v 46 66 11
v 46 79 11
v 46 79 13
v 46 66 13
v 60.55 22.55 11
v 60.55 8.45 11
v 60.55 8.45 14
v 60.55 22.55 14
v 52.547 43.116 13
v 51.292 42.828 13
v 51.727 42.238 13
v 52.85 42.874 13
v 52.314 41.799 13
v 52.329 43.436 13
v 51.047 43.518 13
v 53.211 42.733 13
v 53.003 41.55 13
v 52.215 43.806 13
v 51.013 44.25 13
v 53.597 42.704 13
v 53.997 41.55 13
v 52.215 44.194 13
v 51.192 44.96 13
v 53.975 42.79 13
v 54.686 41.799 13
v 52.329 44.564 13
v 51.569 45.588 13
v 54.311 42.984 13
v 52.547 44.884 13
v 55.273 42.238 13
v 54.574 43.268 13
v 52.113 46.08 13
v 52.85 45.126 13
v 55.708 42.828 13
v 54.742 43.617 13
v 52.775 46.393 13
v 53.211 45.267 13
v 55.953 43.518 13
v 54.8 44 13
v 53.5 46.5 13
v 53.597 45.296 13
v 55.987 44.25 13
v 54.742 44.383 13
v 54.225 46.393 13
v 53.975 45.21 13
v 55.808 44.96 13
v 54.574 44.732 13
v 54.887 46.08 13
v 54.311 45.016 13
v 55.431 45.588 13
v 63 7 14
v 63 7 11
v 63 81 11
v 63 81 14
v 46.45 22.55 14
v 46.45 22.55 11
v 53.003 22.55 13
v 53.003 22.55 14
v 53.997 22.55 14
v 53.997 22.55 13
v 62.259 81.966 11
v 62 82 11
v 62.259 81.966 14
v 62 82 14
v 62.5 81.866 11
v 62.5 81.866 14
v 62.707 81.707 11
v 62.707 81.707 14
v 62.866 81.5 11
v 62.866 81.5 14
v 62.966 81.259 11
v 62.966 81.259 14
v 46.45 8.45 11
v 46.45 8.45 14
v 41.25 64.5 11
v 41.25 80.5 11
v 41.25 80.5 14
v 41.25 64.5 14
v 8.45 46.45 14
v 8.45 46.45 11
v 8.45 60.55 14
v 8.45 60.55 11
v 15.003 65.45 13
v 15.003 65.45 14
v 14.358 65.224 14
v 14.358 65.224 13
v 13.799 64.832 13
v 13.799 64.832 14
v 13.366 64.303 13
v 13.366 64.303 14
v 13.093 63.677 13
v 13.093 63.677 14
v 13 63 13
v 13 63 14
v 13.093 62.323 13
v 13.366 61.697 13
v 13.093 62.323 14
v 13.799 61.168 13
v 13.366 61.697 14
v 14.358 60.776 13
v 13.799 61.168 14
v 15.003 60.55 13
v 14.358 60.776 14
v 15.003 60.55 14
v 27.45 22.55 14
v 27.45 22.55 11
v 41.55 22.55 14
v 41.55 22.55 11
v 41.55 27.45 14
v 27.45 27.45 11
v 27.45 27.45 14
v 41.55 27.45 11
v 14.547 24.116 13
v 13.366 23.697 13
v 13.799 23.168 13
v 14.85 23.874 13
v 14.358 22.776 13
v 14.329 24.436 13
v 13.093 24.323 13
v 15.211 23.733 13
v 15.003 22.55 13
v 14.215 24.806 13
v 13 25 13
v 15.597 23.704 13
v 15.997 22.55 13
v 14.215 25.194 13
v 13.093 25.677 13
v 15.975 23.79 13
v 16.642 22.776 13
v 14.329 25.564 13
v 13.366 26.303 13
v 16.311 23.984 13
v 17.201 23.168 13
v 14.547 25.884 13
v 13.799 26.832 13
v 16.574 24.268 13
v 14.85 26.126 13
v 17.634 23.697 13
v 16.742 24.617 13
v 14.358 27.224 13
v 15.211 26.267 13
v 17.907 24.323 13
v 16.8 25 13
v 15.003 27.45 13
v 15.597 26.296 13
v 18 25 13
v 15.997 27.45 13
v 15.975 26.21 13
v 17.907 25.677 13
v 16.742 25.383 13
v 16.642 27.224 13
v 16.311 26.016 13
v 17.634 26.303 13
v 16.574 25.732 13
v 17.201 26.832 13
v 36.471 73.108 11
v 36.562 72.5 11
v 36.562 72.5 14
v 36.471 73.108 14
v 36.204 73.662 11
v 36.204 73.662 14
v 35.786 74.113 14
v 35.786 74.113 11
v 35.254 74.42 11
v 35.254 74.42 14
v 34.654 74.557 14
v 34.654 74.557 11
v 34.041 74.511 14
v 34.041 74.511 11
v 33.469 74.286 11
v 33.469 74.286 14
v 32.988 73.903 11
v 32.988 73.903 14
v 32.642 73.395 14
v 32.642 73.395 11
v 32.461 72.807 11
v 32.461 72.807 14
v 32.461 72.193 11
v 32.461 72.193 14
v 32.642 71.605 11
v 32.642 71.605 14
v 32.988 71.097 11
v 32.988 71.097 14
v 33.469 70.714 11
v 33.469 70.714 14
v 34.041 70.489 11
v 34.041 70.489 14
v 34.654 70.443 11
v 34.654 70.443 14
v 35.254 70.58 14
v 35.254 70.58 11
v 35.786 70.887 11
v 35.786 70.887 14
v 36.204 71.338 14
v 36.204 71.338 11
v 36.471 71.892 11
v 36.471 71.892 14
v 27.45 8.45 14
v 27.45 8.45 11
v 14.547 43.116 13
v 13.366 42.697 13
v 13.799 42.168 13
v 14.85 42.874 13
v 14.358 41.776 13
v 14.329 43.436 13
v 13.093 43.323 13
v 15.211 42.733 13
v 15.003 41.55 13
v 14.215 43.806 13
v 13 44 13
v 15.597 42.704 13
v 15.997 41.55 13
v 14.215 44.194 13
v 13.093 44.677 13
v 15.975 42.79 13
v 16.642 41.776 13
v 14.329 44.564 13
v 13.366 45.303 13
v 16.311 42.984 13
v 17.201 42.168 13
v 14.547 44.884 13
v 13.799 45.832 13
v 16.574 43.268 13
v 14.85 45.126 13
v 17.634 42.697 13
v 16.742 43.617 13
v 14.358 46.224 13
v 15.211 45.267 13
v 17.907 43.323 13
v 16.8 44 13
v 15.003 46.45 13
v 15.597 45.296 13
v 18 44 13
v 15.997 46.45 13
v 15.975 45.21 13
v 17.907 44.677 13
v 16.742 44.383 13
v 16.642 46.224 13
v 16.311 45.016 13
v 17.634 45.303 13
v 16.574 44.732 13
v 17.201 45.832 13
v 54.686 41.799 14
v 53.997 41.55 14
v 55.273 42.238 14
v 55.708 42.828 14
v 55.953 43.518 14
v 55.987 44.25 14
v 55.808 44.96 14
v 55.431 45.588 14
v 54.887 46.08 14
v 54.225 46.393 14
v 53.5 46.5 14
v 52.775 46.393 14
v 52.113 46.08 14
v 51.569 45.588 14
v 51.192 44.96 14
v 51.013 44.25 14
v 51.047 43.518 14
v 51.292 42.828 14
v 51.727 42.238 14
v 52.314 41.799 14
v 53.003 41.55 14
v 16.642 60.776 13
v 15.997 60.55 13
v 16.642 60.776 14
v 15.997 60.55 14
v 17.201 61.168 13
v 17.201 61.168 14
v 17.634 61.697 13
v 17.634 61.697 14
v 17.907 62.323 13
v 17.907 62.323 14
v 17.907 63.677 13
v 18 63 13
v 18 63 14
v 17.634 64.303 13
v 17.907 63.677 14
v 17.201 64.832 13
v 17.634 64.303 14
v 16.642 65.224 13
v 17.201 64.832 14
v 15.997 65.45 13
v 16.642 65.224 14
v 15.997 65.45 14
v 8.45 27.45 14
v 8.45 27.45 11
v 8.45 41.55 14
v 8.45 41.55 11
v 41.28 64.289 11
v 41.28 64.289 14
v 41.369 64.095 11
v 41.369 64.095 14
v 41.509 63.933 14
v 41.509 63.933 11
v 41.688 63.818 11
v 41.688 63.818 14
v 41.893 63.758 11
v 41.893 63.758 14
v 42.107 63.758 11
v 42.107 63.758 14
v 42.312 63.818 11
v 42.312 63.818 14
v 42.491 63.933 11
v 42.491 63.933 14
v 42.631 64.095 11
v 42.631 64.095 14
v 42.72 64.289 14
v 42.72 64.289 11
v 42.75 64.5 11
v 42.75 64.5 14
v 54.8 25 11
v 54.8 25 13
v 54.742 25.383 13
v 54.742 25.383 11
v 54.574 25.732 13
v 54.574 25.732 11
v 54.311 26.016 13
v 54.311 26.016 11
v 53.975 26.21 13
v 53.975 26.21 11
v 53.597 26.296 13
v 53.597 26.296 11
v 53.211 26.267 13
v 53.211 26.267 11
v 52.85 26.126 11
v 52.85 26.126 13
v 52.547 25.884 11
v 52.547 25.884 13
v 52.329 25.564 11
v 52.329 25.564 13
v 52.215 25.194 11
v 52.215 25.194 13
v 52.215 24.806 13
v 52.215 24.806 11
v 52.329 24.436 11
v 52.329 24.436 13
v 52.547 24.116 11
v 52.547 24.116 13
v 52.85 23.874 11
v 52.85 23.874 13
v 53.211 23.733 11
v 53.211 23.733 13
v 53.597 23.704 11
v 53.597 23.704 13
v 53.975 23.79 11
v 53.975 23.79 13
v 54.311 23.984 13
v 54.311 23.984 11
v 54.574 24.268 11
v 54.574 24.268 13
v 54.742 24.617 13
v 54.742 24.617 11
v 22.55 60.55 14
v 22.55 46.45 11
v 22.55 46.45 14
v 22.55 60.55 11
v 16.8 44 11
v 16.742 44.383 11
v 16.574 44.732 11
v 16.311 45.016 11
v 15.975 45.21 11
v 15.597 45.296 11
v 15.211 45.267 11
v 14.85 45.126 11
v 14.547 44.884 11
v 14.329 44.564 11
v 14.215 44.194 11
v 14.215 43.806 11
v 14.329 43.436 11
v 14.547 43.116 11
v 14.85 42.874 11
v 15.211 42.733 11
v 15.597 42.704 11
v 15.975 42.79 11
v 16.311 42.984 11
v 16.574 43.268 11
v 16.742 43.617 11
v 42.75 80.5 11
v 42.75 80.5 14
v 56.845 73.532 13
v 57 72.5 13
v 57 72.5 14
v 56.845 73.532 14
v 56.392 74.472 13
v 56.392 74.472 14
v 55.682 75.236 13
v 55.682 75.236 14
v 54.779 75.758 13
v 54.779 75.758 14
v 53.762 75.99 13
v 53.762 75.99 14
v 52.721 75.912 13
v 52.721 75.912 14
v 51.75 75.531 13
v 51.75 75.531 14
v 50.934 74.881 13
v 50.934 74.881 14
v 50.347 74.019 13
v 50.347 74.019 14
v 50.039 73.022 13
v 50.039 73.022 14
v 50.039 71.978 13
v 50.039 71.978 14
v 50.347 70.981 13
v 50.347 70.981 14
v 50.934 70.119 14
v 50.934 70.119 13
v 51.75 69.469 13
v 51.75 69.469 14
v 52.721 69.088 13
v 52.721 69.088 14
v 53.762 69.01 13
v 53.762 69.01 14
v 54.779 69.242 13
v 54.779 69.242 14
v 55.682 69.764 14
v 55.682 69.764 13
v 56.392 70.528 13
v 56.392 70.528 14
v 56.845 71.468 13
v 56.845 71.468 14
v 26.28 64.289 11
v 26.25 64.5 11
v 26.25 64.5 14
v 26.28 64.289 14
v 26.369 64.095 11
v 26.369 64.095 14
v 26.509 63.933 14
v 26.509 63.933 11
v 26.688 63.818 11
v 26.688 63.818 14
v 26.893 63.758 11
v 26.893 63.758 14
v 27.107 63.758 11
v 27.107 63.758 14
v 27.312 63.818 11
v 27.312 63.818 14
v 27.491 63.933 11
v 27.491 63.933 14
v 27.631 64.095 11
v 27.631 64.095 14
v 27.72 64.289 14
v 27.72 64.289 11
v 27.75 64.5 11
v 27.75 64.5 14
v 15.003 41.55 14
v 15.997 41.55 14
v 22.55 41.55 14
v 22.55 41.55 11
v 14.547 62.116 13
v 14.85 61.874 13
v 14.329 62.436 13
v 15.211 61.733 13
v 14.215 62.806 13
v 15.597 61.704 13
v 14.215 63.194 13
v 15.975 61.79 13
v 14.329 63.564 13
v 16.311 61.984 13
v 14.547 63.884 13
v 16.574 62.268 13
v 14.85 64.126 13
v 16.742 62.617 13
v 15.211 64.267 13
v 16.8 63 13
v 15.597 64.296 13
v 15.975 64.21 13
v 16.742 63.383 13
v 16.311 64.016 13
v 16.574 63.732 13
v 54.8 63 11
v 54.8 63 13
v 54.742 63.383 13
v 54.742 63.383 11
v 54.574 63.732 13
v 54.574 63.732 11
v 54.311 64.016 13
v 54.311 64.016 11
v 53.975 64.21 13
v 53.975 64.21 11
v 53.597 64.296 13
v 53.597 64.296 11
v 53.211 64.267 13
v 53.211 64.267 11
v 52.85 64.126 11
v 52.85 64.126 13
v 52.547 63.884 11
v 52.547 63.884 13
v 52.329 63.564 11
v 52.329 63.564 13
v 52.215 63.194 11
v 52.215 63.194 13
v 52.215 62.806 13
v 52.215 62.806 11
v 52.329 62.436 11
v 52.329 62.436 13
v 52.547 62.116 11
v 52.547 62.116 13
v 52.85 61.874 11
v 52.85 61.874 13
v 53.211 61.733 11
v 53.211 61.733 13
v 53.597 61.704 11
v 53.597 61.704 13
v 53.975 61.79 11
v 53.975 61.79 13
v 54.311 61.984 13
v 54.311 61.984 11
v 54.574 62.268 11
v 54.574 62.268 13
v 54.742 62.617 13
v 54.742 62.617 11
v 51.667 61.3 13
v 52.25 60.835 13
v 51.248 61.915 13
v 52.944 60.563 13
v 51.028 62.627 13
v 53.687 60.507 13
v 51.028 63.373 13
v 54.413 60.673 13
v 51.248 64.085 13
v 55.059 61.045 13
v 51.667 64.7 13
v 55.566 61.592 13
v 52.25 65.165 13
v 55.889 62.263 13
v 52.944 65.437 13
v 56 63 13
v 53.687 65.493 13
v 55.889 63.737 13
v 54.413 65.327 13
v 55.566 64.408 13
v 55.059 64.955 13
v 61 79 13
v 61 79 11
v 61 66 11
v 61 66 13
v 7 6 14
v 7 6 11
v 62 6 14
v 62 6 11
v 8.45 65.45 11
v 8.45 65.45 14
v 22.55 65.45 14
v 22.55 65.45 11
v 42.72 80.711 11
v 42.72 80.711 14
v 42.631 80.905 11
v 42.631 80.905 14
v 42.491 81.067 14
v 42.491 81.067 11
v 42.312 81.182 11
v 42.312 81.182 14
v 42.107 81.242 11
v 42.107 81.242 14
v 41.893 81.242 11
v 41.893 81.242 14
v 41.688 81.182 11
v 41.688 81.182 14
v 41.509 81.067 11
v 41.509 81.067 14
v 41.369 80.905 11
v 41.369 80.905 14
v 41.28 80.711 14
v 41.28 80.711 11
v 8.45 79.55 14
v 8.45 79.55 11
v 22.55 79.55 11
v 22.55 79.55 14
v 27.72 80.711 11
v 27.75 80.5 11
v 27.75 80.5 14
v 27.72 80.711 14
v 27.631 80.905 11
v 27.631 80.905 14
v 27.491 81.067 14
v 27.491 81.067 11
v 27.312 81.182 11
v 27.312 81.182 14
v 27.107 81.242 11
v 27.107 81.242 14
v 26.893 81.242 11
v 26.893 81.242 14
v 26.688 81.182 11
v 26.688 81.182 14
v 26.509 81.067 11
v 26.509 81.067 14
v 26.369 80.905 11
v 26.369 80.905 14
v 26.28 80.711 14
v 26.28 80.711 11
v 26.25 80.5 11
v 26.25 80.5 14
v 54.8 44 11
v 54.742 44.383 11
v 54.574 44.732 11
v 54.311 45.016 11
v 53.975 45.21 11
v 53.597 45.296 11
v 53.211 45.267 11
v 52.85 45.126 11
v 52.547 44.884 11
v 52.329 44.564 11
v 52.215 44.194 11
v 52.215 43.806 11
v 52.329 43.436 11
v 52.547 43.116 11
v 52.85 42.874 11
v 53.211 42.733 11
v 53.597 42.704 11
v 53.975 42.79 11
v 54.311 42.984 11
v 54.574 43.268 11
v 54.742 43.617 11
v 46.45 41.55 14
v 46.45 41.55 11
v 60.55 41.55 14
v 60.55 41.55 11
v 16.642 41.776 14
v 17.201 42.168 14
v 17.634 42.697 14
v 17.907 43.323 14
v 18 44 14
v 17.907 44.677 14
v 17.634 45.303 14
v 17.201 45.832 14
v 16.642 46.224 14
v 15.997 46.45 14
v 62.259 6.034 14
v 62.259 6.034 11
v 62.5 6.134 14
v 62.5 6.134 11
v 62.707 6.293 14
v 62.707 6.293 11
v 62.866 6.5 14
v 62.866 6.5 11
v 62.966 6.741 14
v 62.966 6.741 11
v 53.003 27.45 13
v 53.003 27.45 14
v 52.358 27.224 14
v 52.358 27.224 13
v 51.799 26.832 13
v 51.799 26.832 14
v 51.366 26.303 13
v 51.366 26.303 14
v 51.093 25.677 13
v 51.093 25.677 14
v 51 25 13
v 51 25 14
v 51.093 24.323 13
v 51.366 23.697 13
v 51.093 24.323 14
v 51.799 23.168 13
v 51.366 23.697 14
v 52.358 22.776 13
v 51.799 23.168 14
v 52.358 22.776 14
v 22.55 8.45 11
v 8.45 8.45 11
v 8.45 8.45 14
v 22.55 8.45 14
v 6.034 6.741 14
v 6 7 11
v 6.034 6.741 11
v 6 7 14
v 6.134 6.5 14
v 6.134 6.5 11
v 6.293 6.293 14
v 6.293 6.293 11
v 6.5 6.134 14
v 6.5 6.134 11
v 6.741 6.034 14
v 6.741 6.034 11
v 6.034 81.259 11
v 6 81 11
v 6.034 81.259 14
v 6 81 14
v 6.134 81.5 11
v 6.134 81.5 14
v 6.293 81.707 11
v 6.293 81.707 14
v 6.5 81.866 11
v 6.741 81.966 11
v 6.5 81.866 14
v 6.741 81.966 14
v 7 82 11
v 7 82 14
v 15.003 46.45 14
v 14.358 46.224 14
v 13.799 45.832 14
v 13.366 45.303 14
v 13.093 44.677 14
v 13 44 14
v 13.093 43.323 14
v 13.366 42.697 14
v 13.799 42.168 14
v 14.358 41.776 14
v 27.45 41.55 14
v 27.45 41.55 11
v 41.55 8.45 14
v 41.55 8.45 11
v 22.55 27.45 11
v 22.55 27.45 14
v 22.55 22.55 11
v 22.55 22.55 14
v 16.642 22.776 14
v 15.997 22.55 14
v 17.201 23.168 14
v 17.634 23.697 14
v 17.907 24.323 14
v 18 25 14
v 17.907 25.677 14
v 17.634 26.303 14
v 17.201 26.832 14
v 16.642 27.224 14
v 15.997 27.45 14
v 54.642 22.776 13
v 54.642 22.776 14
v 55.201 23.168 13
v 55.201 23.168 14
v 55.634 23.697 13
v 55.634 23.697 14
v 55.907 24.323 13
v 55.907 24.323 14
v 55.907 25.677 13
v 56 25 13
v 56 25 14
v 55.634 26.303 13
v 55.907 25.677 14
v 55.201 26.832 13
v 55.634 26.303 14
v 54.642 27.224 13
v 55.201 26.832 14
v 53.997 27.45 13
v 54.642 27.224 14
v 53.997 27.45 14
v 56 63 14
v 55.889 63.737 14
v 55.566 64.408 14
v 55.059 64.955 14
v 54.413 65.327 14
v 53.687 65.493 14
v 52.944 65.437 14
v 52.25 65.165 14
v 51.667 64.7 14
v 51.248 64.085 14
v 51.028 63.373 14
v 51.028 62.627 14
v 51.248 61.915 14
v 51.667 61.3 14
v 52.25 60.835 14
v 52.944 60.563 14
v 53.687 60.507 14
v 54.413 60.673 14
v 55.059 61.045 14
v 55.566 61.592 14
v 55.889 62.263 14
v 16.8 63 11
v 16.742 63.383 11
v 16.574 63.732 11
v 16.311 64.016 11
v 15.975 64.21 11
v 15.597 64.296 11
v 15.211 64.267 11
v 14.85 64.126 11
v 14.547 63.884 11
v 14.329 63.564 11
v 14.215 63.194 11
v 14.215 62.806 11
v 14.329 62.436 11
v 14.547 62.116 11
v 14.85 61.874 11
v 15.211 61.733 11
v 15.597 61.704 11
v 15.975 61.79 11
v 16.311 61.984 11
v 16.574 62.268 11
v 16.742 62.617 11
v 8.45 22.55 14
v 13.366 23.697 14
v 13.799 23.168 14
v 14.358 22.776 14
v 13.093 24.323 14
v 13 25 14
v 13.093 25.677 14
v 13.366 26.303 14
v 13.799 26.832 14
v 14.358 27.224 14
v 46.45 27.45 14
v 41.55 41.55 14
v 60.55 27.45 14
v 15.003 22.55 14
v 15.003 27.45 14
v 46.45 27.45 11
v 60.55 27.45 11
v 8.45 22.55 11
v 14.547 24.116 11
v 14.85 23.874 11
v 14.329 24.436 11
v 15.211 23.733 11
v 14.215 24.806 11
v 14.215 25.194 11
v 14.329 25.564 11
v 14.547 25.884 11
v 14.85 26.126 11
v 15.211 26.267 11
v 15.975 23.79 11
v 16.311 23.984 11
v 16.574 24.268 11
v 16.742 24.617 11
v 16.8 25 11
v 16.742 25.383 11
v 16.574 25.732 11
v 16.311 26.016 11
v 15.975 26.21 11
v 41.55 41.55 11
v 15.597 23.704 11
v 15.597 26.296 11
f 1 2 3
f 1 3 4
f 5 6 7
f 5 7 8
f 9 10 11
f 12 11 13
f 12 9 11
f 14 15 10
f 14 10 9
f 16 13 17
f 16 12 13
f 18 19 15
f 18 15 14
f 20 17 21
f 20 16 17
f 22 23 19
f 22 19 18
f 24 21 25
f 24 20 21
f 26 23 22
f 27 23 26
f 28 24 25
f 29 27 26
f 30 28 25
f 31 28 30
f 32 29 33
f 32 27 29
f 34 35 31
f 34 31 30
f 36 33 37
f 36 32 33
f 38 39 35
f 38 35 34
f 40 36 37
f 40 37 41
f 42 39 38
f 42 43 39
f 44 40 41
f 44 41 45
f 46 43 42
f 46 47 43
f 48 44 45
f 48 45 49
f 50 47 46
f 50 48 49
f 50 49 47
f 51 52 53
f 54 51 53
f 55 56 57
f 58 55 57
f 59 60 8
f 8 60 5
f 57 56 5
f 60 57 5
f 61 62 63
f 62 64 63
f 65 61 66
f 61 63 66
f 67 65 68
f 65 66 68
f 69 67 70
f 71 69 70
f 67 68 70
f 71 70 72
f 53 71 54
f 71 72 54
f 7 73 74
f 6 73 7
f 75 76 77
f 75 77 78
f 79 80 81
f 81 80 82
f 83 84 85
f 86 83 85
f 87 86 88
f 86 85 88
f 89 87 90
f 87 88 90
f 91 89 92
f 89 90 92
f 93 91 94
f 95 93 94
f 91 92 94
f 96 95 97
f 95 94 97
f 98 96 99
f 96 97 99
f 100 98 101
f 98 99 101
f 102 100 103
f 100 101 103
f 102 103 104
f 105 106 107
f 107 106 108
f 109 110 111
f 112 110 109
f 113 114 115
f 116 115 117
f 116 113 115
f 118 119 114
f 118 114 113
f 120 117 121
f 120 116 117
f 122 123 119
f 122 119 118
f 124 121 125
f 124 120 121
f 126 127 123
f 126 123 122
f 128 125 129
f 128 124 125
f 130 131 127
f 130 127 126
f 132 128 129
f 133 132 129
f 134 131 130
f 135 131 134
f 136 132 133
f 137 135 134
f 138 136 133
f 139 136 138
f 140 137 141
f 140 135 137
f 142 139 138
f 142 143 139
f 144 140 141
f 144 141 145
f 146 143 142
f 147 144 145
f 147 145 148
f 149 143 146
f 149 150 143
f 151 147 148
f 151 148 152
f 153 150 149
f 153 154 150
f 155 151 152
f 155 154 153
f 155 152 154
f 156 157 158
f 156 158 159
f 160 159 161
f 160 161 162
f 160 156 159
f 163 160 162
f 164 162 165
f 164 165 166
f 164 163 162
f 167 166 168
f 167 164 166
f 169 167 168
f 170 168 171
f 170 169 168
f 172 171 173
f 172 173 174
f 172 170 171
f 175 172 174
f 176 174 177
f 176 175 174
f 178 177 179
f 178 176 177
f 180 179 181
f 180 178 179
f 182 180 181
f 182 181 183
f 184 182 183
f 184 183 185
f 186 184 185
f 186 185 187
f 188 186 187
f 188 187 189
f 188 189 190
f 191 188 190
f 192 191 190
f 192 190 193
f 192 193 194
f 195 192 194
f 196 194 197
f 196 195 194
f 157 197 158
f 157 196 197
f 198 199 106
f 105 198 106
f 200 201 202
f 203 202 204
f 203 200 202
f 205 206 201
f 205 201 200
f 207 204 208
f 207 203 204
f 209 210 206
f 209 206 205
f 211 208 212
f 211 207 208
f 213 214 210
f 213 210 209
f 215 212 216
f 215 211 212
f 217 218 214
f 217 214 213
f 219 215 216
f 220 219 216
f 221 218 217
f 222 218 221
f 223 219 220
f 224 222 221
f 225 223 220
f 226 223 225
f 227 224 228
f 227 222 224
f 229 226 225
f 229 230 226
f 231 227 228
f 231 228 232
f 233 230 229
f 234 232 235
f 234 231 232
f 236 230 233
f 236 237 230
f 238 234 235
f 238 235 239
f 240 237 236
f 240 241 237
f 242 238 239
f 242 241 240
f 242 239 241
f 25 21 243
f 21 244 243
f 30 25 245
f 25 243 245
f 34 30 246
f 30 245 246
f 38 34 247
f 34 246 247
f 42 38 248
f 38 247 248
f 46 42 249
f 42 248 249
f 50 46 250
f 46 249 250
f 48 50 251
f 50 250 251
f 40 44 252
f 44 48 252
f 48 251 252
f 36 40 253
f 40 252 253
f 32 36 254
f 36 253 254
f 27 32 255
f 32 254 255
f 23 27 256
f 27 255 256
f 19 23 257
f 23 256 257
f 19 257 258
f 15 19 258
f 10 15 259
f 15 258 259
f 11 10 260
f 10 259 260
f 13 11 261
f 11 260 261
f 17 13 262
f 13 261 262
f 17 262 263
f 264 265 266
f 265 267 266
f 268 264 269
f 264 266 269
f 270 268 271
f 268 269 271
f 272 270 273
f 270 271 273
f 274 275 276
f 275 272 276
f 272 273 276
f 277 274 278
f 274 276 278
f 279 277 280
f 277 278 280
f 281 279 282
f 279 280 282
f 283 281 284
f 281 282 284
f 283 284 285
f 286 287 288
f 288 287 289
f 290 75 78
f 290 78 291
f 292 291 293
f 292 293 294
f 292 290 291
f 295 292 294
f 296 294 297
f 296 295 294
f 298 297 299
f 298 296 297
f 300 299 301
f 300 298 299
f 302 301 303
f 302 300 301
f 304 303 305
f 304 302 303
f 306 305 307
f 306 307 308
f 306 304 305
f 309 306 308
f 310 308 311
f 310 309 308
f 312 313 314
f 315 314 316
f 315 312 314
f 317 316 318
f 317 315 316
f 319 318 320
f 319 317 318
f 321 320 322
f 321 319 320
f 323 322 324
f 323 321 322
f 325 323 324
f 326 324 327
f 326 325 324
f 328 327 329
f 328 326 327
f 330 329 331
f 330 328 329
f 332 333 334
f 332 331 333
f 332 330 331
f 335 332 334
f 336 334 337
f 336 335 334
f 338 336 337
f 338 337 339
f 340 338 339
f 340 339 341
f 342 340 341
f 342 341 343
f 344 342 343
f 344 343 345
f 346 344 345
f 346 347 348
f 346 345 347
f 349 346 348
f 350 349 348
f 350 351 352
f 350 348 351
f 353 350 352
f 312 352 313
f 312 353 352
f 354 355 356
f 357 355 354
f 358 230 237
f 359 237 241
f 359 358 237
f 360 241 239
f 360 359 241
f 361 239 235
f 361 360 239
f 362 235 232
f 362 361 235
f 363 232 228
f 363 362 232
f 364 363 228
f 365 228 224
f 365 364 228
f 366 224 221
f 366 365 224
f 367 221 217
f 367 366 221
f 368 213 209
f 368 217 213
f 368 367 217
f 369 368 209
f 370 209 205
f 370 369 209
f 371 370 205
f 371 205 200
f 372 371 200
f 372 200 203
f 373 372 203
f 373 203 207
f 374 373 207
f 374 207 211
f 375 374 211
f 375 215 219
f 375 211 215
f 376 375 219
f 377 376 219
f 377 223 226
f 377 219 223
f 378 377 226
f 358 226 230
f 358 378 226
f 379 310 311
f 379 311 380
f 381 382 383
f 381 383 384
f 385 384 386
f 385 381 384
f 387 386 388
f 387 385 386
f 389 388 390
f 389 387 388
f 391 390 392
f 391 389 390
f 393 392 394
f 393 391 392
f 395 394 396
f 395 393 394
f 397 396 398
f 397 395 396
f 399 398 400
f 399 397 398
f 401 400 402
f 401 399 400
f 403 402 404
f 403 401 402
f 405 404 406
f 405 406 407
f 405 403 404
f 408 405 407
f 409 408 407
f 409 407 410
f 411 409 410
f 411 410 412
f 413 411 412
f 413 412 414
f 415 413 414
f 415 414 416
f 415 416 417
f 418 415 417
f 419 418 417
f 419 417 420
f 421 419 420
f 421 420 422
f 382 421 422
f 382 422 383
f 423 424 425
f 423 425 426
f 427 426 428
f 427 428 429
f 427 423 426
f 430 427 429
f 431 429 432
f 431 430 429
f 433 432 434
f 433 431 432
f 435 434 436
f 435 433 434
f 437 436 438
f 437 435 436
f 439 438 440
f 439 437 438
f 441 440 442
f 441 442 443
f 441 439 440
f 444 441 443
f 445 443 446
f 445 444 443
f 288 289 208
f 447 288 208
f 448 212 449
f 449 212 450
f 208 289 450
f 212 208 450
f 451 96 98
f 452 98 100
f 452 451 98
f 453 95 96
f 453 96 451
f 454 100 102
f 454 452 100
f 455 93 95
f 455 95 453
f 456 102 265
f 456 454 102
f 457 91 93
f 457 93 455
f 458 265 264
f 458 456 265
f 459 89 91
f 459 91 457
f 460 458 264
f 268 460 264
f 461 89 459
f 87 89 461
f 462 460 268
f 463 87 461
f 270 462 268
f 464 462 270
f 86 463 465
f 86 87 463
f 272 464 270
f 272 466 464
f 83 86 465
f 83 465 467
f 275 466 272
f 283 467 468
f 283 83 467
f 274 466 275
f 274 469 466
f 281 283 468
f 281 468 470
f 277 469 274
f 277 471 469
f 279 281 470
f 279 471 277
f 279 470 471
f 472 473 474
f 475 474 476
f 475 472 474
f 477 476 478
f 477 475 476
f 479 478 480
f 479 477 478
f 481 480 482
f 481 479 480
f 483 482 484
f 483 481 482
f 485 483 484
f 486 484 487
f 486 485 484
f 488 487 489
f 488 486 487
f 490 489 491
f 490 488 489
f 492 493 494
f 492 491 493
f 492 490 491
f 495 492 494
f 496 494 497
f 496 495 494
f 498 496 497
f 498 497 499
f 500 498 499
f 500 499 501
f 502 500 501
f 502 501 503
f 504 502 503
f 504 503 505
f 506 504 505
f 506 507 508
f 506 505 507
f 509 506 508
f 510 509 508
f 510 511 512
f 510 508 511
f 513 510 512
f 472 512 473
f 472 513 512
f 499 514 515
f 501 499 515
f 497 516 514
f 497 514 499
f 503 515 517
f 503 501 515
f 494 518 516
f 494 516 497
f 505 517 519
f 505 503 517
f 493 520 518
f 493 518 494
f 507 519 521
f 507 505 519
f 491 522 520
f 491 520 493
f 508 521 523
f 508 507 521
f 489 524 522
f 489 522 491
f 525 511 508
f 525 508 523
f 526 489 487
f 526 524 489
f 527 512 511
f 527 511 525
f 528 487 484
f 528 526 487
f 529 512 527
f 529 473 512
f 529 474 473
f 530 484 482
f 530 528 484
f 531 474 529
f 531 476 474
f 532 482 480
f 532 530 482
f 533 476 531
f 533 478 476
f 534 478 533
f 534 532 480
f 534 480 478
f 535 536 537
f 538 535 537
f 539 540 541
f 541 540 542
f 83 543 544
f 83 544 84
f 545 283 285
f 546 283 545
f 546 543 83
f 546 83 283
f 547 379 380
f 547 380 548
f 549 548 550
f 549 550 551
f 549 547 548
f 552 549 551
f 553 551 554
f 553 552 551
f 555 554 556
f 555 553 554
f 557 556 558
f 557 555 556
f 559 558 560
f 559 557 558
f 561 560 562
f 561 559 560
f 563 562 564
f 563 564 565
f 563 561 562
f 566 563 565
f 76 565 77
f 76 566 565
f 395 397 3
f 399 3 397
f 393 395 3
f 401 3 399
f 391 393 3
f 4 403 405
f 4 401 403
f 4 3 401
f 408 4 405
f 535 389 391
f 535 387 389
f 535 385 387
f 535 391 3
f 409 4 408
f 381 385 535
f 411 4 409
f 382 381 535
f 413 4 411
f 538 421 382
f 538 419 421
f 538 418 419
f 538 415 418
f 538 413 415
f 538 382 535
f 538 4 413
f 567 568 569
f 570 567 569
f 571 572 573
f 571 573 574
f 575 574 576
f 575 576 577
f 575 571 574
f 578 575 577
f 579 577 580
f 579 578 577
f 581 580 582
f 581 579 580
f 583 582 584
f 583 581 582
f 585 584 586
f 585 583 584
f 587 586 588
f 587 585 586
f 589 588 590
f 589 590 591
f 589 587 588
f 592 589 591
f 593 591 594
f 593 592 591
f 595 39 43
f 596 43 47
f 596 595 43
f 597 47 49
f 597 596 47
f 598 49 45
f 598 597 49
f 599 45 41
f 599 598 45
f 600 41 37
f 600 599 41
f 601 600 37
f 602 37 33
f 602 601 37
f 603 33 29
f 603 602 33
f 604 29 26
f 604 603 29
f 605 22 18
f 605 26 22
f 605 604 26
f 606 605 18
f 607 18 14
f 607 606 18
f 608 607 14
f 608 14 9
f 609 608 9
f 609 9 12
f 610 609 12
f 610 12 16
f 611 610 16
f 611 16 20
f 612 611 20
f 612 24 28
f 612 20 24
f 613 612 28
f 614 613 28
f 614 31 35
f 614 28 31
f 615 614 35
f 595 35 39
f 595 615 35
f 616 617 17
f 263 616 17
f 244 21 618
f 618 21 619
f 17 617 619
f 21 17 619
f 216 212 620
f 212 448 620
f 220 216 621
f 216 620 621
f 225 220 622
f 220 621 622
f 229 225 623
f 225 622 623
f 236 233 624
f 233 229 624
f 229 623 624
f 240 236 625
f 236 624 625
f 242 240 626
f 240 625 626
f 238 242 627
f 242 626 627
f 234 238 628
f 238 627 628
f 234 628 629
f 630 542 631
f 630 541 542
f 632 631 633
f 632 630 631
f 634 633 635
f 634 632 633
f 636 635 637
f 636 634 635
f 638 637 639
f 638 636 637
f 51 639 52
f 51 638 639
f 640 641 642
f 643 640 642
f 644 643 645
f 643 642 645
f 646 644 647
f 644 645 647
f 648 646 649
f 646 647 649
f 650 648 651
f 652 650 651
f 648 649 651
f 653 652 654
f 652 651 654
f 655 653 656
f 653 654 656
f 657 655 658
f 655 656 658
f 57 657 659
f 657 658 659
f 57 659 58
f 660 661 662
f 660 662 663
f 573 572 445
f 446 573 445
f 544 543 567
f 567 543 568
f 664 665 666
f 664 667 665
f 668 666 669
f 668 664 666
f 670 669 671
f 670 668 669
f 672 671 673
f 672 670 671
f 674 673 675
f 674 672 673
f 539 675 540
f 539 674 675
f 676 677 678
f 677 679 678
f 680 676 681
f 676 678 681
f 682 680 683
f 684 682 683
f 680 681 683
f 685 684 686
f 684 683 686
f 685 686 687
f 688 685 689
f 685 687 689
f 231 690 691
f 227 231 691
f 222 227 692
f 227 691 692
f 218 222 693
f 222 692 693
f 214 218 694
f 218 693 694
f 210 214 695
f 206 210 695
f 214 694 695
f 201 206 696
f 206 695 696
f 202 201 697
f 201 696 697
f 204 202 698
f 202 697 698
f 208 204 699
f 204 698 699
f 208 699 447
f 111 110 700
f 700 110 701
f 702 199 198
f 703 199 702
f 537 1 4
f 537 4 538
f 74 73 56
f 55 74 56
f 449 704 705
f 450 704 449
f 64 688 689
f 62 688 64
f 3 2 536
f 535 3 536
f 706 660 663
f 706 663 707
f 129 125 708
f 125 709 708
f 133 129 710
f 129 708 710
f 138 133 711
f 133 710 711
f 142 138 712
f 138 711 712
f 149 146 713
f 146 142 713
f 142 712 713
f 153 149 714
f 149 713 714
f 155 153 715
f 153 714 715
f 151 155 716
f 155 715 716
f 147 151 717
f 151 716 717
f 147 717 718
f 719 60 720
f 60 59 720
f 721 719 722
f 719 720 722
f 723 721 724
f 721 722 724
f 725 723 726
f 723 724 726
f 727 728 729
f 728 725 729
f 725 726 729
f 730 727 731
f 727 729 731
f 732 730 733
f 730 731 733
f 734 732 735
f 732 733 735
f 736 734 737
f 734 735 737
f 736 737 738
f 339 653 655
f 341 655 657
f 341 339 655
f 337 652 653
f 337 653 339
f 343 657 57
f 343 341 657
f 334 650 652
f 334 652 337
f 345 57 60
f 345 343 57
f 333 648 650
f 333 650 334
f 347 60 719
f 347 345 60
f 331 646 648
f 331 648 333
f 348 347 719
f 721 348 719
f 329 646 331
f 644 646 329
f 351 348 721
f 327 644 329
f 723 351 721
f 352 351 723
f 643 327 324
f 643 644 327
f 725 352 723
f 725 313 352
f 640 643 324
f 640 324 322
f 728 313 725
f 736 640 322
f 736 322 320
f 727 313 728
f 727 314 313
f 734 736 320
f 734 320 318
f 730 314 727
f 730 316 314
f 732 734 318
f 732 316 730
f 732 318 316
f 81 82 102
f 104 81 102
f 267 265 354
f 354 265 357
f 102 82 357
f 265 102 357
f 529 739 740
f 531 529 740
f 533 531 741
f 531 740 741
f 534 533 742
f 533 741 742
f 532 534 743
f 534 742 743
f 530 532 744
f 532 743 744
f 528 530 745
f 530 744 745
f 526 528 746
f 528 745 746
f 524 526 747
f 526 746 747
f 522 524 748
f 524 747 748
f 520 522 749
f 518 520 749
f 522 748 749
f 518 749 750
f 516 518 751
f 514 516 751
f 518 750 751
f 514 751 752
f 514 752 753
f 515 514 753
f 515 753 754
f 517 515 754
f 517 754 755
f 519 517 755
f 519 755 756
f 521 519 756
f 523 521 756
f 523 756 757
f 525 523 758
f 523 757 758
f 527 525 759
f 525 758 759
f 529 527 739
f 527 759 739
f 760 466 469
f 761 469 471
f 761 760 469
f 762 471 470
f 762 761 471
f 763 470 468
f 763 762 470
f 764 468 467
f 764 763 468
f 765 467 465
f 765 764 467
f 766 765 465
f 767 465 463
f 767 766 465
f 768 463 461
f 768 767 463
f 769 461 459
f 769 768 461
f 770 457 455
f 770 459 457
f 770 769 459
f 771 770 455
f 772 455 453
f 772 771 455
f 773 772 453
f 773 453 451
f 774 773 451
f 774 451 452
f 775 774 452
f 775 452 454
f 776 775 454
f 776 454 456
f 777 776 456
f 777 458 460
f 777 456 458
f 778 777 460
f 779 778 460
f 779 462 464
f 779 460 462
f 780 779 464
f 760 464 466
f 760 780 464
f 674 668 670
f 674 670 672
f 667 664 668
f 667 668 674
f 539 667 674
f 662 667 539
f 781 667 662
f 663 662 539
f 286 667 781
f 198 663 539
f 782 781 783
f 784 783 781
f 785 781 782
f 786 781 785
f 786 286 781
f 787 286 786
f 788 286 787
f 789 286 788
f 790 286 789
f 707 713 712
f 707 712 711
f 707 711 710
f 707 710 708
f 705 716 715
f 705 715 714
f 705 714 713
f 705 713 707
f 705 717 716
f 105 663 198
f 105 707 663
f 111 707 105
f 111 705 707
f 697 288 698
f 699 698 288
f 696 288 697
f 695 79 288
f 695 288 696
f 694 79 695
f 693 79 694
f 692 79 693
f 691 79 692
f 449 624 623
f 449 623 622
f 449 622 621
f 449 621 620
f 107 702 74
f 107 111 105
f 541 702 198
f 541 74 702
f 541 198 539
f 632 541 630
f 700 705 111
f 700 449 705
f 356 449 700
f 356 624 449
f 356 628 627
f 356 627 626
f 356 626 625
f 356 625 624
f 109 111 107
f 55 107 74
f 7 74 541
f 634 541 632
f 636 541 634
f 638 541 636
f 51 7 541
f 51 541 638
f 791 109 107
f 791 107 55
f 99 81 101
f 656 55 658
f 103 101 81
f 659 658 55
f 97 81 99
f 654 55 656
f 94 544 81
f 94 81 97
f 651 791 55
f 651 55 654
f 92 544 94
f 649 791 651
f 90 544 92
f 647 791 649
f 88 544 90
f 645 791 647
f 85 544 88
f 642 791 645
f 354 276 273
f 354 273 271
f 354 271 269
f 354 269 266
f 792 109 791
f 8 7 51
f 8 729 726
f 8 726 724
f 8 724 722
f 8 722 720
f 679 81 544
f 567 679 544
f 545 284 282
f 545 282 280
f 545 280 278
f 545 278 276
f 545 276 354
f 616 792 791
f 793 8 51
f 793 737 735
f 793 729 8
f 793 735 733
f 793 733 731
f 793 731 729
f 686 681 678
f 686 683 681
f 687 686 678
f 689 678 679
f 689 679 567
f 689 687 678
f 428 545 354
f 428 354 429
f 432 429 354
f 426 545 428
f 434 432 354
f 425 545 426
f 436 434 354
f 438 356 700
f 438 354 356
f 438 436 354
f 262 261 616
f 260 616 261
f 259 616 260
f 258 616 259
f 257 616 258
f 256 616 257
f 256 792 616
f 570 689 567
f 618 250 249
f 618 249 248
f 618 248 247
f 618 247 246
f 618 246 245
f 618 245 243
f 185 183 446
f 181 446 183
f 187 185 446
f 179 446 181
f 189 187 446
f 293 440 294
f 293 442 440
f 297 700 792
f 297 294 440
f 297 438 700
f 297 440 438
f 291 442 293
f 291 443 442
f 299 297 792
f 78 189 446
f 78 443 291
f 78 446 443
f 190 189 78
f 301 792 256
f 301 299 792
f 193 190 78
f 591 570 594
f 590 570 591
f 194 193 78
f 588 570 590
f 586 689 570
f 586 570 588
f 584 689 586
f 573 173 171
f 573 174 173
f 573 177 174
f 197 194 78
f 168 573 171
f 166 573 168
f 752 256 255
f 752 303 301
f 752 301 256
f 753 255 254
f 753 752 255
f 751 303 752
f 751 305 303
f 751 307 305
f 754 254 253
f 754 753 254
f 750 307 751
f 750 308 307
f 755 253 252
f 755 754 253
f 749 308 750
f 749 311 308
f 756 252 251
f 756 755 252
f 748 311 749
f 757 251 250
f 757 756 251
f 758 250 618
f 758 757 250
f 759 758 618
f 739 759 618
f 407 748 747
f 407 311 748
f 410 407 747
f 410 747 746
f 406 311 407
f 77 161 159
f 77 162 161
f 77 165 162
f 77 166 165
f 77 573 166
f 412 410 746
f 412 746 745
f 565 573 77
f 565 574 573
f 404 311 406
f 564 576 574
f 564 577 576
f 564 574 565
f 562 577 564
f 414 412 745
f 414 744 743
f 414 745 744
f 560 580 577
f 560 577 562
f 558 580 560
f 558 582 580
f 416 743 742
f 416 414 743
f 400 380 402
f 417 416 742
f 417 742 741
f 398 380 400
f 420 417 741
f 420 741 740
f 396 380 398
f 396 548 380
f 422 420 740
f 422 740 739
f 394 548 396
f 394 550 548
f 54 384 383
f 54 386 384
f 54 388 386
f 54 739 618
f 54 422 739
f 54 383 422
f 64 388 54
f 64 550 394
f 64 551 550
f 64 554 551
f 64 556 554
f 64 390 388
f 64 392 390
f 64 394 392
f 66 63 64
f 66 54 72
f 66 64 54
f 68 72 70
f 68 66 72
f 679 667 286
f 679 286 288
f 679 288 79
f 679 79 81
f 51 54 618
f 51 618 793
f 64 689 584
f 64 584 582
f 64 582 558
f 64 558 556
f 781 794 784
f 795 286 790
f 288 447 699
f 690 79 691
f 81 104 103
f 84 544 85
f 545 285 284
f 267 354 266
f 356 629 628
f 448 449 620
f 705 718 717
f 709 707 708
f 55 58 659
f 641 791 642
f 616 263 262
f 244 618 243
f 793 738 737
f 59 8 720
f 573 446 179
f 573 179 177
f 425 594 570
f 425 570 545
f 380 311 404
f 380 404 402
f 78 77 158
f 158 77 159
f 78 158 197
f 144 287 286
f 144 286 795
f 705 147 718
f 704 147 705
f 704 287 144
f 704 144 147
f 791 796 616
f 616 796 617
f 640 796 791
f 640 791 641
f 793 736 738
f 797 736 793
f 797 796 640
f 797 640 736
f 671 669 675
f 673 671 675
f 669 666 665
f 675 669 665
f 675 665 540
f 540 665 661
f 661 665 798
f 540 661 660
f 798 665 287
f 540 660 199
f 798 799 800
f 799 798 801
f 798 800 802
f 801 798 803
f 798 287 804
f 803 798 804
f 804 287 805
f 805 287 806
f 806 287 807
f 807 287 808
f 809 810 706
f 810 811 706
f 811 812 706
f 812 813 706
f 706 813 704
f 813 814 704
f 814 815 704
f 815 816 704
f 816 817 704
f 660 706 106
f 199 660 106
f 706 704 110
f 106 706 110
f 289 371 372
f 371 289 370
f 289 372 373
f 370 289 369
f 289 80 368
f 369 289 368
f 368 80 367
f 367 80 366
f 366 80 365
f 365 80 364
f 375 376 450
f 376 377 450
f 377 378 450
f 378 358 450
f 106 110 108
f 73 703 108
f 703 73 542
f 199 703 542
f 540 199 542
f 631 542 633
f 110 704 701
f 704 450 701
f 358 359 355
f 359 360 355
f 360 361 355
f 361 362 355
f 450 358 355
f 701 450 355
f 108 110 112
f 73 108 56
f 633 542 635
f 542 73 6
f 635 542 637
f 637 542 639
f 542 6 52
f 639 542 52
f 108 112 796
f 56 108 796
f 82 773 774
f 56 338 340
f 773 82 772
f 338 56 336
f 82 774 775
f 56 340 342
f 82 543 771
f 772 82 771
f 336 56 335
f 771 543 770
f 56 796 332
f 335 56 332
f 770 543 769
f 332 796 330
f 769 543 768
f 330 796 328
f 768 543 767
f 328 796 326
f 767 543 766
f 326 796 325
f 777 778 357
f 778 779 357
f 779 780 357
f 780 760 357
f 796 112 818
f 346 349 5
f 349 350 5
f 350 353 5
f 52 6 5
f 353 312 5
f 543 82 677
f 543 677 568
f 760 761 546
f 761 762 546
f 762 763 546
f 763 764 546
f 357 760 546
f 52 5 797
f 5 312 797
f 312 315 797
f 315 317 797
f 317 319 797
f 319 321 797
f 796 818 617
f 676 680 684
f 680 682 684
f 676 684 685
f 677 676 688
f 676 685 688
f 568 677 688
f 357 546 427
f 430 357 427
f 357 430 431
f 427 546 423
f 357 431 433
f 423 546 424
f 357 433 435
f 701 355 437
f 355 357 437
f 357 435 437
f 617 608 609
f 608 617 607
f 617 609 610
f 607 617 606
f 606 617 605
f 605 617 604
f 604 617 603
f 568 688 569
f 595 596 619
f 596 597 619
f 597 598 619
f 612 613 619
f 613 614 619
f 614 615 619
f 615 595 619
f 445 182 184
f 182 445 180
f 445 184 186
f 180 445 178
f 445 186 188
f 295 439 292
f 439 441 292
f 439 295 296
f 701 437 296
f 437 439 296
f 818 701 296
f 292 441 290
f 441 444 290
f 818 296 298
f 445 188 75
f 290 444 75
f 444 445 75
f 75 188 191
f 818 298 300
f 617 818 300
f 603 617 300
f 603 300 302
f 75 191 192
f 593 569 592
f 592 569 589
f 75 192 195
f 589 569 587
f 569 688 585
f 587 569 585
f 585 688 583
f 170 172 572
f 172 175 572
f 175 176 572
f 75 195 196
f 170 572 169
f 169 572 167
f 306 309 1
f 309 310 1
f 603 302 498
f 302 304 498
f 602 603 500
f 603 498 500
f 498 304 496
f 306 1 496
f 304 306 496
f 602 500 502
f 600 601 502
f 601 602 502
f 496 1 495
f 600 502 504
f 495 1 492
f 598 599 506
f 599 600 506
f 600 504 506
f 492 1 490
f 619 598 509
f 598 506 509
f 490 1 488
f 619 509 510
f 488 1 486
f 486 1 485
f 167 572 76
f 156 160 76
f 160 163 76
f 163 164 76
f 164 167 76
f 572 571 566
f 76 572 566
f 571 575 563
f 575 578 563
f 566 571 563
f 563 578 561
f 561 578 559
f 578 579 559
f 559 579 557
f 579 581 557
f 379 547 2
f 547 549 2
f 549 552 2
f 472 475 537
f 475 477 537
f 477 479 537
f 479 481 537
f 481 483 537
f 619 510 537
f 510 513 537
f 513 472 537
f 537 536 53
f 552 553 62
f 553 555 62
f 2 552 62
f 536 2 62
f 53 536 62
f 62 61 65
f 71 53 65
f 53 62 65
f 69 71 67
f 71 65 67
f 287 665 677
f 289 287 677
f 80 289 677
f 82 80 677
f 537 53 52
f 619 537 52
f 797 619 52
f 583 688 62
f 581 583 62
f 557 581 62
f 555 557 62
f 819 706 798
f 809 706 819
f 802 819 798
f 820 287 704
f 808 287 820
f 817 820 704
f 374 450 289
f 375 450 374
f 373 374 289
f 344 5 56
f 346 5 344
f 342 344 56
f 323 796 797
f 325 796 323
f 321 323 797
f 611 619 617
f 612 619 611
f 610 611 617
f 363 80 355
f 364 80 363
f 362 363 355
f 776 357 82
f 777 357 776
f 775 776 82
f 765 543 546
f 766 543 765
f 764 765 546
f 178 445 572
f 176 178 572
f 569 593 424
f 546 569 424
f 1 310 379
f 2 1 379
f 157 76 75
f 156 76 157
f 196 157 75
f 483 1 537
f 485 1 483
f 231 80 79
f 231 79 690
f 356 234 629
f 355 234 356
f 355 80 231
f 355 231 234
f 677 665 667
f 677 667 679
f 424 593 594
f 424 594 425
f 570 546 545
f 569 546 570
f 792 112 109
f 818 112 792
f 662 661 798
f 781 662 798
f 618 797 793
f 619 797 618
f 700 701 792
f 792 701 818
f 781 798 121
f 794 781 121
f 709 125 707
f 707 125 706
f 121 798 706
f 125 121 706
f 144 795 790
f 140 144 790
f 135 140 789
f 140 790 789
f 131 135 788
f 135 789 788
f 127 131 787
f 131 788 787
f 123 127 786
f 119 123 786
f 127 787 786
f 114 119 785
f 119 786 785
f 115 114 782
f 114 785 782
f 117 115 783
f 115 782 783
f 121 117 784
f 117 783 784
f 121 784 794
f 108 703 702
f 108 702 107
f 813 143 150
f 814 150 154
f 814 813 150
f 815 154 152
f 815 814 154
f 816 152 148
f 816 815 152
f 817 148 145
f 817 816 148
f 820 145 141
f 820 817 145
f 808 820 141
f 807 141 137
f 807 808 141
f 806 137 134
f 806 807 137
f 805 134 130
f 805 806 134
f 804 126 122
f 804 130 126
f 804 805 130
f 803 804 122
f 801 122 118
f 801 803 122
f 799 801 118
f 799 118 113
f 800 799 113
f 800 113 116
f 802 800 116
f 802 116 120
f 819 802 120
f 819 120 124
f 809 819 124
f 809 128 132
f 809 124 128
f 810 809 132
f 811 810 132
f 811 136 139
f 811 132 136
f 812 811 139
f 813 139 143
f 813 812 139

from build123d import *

# Parameters (mm, degrees)
SKETCH020_W     = 57
SKETCH020_H     = 76
SKETCH020_R     = 3.5
SKETCH020_R_2   = 1.3
SKETCH020_R_3   = 2.0625
SKETCH020_W_2   = 14.1
SKETCH020_H_2   = 14.1
PAD005_DEPTH    = 3
SKETCH022_W     = 15
SKETCH022_H     = 13
POCKET013_DEPTH = 2
FILLET005_R     = 1
SKETCH027_R     = 2.5
POCKET017_DEPTH = 1


with BuildPart() as part:
    # Sketch020 → Pad005 (new body)
    with BuildSketch(Plane.XY):
        with Locations((28.5, 38)):
            Rectangle(SKETCH020_W, SKETCH020_H)
        with Locations((47.5, 66.5)):
            Circle(SKETCH020_R, mode=Mode.SUBTRACT)
        with Locations((9.5, 57)):
            Circle(SKETCH020_R_2, mode=Mode.SUBTRACT)
        with Locations((9.5, 19)):
            Circle(SKETCH020_R_2, mode=Mode.SUBTRACT)
        with Locations((47.5, 19)):
            Circle(SKETCH020_R_2, mode=Mode.SUBTRACT)
        with Locations((47.5, 57)):
            Circle(SKETCH020_R_2, mode=Mode.SUBTRACT)
        with Locations((9.5, 38)):
            Circle(SKETCH020_R_2, mode=Mode.SUBTRACT)
        with Locations((47.5, 38)):
            Circle(SKETCH020_R_2, mode=Mode.SUBTRACT)
        with Locations((28.5, 66.5)):
            Circle(SKETCH020_R_3, mode=Mode.SUBTRACT)
        with Locations((9.5, 9.5)):
            Rectangle(SKETCH020_W_2, SKETCH020_H_2, mode=Mode.SUBTRACT)
        with Locations((9.5, 28.5)):
            Rectangle(SKETCH020_W_2, SKETCH020_H_2, mode=Mode.SUBTRACT)
        with Locations((9.5, 47.5)):
            Rectangle(SKETCH020_W_2, SKETCH020_H_2, mode=Mode.SUBTRACT)
        with Locations((9.5, 66.5)):
            Rectangle(SKETCH020_W_2, SKETCH020_H_2, mode=Mode.SUBTRACT)
        with Locations((28.5, 28.5)):
            Rectangle(SKETCH020_W_2, SKETCH020_H_2, mode=Mode.SUBTRACT)
        with Locations((47.5, 28.5)):
            Rectangle(SKETCH020_W_2, SKETCH020_H_2, mode=Mode.SUBTRACT)
        with Locations((28.5, 9.5)):
            Rectangle(SKETCH020_W_2, SKETCH020_H_2, mode=Mode.SUBTRACT)
        with Locations((47.5, 9.5)):
            Rectangle(SKETCH020_W_2, SKETCH020_H_2, mode=Mode.SUBTRACT)
        with BuildLine():
            ThreePointArc((21.75, 74.5), (21, 75.25), (20.25, 74.5))
            Line((20.25, 74.5), (20.25, 58.5))
            ThreePointArc((20.25, 58.5), (21, 57.75), (21.75, 58.5))
            Line((21.75, 74.5), (21.75, 58.5))
        make_face(mode=Mode.SUBTRACT)
        with BuildLine():
            ThreePointArc((36.75, 74.5), (36, 75.25), (35.25, 74.5))
            Line((35.25, 74.5), (35.25, 58.5))
            ThreePointArc((35.25, 58.5), (36, 57.75), (36.75, 58.5))
            Line((36.75, 58.5), (36.75, 74.5))
        make_face(mode=Mode.SUBTRACT)
    extrude(amount=PAD005_DEPTH)

    # Sketch022 → Pocket013 (cut)
    with BuildSketch(Plane(origin=(0, 0, 0), x_dir=(1, 0, 0), z_dir=(0, 0, -1))):
        with Locations((47.5, -66.5)):
            Rectangle(SKETCH022_W, SKETCH022_H)
    extrude(amount=-POCKET013_DEPTH, mode=Mode.SUBTRACT)

    # Fillet005
    fillet005_edges = [part.edges().sort_by_distance(p)[0] for p in [
        (0, 0, 1.5),
        (57, 0, 1.5),
        (57, 76, 1.5),
        (0, 76, 1.5),
    ]]
    fillet(fillet005_edges, radius=FILLET005_R)

    # Sketch027 (on Face5 of Fillet005) → Pocket017 (cut)
    with BuildSketch(Plane.XY.offset(3)):
        with Locations((9.5, 57)):
            Circle(SKETCH027_R)
        with Locations((9.5, 38)):
            Circle(SKETCH027_R)
        with Locations((47.5, 57)):
            Circle(SKETCH027_R)
        with Locations((47.5, 38)):
            Circle(SKETCH027_R)
        with Locations((47.5, 19)):
            Circle(SKETCH027_R)
        with Locations((9.5, 19)):
            Circle(SKETCH027_R)
    extrude(amount=-POCKET017_DEPTH, mode=Mode.SUBTRACT)


with BuildPart() as part_1:
    # Body004 placement: moved
    add(part.part.moved(Location((6, 6, 11))))


solid = part_1.part
